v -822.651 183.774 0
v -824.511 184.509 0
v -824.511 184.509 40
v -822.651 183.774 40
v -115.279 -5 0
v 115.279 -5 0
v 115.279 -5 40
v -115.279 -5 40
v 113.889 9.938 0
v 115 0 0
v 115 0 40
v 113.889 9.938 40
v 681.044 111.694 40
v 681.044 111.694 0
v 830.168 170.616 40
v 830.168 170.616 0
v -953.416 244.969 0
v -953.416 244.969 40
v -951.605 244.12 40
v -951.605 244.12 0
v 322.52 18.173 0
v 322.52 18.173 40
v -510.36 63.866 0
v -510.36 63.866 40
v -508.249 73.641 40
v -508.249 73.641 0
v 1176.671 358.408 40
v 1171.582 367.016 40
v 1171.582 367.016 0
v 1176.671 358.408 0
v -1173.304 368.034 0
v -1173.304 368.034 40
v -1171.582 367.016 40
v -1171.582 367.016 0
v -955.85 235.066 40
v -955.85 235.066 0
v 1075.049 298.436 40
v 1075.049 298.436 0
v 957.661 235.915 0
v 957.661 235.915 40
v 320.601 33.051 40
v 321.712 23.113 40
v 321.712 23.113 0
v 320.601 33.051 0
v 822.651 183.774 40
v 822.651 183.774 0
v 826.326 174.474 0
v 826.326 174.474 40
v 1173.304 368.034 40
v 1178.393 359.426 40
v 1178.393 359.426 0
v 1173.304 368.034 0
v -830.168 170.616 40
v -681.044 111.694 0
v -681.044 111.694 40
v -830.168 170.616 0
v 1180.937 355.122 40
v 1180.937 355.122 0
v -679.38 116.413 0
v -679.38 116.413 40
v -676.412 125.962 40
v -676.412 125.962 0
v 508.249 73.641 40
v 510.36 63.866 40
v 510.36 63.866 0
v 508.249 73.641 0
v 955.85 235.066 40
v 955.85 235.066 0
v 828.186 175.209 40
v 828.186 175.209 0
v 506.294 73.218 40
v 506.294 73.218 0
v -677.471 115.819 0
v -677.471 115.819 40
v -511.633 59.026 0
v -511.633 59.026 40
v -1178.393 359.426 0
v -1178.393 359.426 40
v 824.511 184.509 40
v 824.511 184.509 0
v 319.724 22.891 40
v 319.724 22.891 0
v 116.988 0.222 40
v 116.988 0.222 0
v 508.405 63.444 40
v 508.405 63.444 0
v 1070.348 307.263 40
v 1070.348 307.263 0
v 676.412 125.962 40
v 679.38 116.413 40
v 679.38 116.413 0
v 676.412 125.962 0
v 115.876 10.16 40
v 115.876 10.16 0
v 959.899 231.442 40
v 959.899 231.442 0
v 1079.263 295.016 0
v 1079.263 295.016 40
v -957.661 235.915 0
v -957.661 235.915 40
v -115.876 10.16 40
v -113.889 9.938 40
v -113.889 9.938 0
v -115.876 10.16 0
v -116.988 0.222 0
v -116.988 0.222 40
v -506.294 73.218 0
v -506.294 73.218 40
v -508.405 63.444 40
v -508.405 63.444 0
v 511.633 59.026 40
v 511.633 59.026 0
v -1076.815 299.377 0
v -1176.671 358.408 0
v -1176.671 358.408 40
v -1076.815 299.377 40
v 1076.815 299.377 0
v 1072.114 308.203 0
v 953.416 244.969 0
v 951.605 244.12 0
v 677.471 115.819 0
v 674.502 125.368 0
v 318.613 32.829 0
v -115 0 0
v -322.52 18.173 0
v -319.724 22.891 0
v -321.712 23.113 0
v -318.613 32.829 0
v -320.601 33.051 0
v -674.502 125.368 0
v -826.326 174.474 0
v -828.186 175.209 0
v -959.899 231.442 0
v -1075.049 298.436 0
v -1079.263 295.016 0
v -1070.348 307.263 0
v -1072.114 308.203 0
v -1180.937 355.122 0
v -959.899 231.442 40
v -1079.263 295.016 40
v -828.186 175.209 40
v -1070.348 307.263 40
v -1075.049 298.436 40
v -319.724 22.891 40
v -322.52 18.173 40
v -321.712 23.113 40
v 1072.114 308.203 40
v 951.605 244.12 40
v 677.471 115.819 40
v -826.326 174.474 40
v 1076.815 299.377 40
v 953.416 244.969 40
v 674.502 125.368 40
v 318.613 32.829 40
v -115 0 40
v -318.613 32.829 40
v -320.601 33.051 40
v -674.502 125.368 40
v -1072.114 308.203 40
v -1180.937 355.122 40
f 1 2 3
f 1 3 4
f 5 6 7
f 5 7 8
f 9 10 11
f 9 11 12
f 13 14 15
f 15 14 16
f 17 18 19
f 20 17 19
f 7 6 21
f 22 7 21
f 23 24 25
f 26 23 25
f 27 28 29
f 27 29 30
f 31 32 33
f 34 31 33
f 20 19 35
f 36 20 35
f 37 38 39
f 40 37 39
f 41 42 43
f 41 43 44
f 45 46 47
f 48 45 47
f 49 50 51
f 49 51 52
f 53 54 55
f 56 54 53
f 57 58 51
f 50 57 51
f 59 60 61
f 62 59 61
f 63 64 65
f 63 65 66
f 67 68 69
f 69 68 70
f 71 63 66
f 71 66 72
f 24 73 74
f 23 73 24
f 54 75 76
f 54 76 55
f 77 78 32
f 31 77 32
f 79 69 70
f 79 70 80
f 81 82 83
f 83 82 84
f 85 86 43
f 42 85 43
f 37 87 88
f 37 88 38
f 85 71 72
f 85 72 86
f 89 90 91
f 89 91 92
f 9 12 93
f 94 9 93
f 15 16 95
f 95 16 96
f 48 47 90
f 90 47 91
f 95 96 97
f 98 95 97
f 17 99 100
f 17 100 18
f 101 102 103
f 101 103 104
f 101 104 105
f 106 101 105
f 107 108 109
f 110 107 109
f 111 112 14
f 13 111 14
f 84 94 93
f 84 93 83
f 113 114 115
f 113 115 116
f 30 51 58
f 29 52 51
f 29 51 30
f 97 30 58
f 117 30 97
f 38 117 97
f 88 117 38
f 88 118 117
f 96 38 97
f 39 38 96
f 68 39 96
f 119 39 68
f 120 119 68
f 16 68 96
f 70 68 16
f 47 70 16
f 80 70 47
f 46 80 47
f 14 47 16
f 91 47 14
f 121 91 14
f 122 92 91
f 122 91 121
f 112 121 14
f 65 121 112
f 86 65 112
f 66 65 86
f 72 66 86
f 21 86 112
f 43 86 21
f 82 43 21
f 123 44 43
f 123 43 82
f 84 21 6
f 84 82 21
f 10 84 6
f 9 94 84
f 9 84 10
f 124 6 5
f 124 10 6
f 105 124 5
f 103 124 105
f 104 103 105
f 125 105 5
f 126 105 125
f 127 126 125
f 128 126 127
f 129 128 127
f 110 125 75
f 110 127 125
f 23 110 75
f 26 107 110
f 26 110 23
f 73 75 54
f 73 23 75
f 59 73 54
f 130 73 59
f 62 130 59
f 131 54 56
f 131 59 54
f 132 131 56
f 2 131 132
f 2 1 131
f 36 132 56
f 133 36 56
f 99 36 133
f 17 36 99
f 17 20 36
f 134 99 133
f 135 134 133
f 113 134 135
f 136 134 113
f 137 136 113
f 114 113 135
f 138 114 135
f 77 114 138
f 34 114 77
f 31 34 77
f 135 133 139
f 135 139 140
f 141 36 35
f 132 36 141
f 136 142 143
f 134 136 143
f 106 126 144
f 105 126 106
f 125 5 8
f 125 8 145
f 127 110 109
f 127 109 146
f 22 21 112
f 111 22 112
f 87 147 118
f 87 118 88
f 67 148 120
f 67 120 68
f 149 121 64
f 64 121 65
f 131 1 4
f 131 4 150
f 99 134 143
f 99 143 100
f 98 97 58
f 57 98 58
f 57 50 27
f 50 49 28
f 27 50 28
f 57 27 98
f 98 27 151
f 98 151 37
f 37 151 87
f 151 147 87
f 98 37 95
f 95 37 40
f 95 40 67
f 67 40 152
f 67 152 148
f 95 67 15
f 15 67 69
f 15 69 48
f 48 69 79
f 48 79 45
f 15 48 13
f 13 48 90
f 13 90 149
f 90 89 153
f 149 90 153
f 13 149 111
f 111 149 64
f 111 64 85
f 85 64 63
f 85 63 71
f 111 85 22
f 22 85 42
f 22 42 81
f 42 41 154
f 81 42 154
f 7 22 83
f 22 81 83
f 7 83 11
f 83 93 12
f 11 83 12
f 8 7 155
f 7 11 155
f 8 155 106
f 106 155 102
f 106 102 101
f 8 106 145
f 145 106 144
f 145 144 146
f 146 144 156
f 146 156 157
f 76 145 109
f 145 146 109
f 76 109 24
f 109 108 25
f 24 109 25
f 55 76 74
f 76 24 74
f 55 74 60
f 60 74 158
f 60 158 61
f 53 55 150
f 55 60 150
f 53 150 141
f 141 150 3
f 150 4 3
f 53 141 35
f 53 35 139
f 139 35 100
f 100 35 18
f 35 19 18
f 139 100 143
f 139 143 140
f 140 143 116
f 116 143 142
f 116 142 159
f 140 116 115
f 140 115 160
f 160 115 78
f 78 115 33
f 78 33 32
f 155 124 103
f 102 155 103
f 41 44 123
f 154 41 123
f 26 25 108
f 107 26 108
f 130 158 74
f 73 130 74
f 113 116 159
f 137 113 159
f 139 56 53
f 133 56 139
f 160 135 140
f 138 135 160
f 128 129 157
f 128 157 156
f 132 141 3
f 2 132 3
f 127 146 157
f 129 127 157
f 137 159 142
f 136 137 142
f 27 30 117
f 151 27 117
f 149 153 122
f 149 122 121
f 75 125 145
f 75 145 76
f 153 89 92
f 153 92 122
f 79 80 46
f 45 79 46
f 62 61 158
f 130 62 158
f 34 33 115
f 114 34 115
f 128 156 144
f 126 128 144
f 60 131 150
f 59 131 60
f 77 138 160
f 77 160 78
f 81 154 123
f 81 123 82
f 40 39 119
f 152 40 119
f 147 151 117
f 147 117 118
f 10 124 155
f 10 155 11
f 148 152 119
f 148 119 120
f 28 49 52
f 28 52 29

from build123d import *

# Parameters (mm, degrees)
EXTRUDE_1_DEPTH = 40
EXTRUDE_2_DEPTH = 40


with BuildPart() as part:
    # 草图1 → 凸台-拉伸1 (new body)
    with BuildSketch(Plane.XY):
        Polygon((-115, 0), (115, 0), (115, -5), (-115.278668015, -5), (-322.519573187, 18.17254404), (-511.63276316, 59.025714898), (-681.043594869, 111.694020512), (-830.167599932, 170.615996068), (-959.898827689, 231.441774436), (-1079.263175746, 295.015855057), (-1180.937012969, 355.121645311), (-1178.392557068, 359.425799603), (-1076.814515779, 299.376640342), (-957.66086644, 235.914778968), (-828.185710586, 175.209062462), (-679.380389192, 116.413005408), (-510.360191041, 63.866144258), (-321.711807872, 23.113383276), align=None)
    extrude_1 = extrude(amount=EXTRUDE_1_DEPTH)

    # 草图2 → 凸台-拉伸2 (add)
    with BuildSketch(Plane.XY.offset(40)):
        Polygon((-115, 0), (-113.88877965, 9.938067686), (-115.876393187, 10.160311756), (-116.987613537, 0.22224407), align=None)
        Polygon((-321.711807872, 23.113383276), (-320.600587522, 33.051450962), (-318.612973985, 32.829206892), (-319.724194334, 22.891139206), align=None)
        Polygon((-510.360191041, 63.866144258), (-508.248649021, 73.640671883), (-506.293743496, 73.21836348), (-508.405285516, 63.443835854), align=None)
        Polygon((-679.380389192, 116.413005408), (-676.411639975, 125.962169146), (-674.501807228, 125.368419302), (-677.470556445, 115.819255565), align=None)
        Polygon((-828.185710586, 175.209062462), (-824.51095702, 184.509395049), (-822.650890502, 183.774444336), (-826.325644068, 174.474111749), align=None)
        Polygon((-957.66086644, 235.914778968), (-953.41571144, 244.968985671), (-951.604870099, 244.119954671), (-955.850025099, 235.065747968), align=None)
        Polygon((-1076.814515779, 299.376640342), (-1072.113637159, 308.20283659), (-1070.34839791, 307.262660865), (-1075.04927653, 298.436464618), align=None)
        Polygon((-1178.392557068, 359.425799603), (-1173.303645267, 368.034108187), (-1171.58198355, 367.016325826), (-1176.670895352, 358.408017242), align=None)
    extrude_2 = extrude(amount=-EXTRUDE_2_DEPTH)

    # 镜向1: 凸台-拉伸1, 凸台-拉伸2 across plane
    add(extrude_1.mirror(Plane(origin=(0, 0, 0), x_dir=(0, 0, 1), z_dir=(1, 0, 0))))
    add(extrude_2.mirror(Plane(origin=(0, 0, 0), x_dir=(0, 0, 1), z_dir=(1, 0, 0))))


solid = part.part
